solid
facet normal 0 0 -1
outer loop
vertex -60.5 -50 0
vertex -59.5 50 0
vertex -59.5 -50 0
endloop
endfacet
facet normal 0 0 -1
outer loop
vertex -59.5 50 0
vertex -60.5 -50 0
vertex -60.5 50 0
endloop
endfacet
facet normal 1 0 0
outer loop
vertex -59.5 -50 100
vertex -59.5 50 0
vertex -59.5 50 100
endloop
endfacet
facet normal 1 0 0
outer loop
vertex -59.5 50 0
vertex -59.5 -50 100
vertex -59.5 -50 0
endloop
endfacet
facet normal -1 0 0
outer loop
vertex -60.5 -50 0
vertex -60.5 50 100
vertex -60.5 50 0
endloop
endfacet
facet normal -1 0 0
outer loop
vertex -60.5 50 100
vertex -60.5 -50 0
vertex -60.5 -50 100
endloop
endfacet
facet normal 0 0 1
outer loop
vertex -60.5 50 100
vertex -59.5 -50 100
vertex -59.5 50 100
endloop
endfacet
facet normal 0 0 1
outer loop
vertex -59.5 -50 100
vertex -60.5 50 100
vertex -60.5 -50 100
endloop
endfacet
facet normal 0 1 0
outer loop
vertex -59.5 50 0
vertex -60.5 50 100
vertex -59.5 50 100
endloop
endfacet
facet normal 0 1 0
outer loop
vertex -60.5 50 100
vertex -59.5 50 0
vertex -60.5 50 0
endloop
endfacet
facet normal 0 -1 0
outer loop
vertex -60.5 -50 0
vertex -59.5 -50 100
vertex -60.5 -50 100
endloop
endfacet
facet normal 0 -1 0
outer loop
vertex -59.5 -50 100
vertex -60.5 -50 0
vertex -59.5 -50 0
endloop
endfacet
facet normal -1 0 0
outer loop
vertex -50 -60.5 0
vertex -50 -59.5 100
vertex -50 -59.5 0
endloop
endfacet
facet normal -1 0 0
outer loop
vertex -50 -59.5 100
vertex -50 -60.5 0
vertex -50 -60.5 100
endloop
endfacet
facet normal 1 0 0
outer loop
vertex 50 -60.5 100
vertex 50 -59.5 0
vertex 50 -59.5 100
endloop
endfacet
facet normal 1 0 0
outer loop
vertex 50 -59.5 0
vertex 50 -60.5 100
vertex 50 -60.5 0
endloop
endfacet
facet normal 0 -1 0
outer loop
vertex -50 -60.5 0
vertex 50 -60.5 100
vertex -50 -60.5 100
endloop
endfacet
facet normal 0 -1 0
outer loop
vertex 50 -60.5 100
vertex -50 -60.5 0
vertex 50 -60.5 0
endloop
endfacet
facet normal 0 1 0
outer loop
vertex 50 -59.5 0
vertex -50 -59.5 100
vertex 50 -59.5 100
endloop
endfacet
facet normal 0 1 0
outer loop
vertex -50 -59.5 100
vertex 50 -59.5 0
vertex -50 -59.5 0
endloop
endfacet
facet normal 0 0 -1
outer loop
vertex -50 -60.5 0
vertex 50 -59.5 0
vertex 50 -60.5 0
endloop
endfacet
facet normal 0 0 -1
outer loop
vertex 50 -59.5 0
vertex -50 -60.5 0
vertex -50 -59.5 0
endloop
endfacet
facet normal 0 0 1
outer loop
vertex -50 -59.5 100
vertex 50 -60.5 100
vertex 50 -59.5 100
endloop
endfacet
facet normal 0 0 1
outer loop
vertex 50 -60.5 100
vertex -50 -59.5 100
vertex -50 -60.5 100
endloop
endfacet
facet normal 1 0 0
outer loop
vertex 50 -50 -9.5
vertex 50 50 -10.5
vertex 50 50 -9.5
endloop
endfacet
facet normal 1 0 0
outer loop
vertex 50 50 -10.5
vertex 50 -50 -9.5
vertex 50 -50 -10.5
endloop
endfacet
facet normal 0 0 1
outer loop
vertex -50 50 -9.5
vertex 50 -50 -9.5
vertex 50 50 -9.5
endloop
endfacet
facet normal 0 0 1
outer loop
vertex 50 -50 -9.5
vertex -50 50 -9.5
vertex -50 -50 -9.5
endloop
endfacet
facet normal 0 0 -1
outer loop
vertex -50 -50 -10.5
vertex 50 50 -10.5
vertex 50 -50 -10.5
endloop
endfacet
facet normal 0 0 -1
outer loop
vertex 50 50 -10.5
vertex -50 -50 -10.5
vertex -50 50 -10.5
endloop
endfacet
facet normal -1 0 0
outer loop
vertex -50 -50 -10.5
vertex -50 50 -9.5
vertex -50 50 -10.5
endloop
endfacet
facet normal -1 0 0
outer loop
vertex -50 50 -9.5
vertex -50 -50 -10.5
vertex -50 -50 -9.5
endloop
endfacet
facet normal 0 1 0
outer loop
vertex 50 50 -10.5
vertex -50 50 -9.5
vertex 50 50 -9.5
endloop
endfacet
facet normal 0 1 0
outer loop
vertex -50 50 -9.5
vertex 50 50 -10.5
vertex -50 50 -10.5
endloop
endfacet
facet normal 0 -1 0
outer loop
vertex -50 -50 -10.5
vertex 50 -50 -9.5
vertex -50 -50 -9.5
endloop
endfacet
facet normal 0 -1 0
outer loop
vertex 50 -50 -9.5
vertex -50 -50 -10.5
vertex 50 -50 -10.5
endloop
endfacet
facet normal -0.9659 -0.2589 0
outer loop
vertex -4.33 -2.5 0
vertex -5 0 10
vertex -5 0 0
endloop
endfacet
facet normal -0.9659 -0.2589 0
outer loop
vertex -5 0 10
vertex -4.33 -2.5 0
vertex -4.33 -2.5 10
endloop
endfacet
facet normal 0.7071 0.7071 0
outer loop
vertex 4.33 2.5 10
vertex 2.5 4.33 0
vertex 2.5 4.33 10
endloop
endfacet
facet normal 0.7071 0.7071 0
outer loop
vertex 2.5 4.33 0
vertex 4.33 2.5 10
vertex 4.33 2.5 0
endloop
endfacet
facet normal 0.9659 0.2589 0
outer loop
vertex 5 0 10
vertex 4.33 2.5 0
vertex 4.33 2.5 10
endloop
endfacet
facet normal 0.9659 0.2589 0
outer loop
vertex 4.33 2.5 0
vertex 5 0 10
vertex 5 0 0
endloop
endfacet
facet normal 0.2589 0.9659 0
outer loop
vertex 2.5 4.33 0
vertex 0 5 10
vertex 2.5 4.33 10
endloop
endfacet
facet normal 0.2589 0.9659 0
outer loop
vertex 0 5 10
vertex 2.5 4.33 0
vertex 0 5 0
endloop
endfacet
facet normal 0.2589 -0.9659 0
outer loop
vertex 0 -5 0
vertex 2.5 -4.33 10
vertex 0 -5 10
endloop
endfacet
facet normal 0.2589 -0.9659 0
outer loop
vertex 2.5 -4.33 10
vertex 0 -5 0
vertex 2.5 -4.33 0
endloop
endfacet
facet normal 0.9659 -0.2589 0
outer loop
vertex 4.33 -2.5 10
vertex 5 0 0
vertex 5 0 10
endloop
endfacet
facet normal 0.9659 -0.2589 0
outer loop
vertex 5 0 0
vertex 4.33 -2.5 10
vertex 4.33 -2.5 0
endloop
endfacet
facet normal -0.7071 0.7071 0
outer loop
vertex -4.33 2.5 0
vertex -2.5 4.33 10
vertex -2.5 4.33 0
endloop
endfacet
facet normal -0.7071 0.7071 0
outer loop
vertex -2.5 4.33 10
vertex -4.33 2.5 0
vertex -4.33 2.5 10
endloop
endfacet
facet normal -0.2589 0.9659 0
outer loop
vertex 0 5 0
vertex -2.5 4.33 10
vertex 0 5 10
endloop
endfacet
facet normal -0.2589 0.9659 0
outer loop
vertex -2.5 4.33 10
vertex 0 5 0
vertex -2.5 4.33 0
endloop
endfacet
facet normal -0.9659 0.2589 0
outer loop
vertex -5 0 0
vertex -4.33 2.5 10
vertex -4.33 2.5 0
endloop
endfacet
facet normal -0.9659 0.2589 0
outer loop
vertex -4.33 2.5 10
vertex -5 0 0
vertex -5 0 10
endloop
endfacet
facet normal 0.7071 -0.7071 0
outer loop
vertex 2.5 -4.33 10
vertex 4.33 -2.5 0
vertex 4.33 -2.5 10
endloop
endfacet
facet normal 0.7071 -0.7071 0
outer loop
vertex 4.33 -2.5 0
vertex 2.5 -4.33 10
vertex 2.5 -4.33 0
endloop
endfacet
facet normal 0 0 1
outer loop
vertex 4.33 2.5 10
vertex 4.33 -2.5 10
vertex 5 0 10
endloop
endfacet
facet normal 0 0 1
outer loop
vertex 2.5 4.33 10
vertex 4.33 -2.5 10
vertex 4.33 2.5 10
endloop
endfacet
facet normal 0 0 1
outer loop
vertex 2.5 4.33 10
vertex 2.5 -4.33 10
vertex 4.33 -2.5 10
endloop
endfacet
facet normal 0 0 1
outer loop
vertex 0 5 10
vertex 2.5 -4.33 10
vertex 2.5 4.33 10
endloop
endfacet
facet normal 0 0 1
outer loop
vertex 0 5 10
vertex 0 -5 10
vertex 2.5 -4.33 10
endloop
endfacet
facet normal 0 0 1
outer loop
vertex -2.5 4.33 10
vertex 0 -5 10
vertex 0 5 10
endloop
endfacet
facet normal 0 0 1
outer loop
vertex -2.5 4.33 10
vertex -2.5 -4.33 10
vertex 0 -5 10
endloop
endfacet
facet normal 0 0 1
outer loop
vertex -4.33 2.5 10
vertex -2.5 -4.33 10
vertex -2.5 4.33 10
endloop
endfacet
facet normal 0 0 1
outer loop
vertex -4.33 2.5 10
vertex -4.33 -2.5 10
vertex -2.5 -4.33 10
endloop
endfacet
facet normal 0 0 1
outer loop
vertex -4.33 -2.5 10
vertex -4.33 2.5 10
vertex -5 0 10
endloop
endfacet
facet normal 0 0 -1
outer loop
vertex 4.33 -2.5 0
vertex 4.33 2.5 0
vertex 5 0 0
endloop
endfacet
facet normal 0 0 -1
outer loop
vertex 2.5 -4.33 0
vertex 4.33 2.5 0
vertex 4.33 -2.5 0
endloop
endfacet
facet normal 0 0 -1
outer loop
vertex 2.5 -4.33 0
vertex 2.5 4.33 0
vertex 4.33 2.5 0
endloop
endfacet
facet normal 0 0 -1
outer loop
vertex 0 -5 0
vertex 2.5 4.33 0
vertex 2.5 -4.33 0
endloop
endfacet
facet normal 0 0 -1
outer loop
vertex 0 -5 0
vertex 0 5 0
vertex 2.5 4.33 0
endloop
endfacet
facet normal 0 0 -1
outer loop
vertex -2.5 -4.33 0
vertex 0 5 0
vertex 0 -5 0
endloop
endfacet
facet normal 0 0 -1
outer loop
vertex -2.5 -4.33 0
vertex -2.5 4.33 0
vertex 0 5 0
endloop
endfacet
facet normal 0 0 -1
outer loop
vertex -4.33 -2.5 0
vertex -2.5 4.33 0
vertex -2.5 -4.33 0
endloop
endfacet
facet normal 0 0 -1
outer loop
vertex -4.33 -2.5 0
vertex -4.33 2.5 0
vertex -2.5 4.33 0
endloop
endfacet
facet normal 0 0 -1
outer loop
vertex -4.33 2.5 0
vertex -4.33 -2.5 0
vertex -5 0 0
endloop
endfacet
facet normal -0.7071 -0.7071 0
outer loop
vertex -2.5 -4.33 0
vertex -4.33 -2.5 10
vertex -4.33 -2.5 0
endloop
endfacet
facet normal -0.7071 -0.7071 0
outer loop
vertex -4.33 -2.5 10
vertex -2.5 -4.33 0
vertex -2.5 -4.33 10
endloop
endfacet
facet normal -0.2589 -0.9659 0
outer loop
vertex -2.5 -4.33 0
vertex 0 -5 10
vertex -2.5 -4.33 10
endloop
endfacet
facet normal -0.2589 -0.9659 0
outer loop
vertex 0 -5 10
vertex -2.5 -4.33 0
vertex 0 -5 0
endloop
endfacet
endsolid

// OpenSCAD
// basic_courge.scad ###################

// uses & includes #####################

// internal vars #######################

$fn = 12;

// internal functions ##################

// internal modules ####################

module leg() {
  //
  //
}

module body() {
  translate([0,0,0]) union() {
    //
    cylinder(h=10,d=10);
    //
  }
}

// outputs #############################

module helpers() {
  translate([-60,0,50]) rotate([0,90,0]) cube([100,100,1],center=true);
  translate([0,-60,50]) rotate([90,0,0]) cube([100,100,1],center=true);
  translate([0,0,-10]) cube([100,100,1],center=true);
}

module main() {
  //
  body();
  //
  //rotate([0,0,45]) leg();
  //
}

color("red") helpers();
main();
